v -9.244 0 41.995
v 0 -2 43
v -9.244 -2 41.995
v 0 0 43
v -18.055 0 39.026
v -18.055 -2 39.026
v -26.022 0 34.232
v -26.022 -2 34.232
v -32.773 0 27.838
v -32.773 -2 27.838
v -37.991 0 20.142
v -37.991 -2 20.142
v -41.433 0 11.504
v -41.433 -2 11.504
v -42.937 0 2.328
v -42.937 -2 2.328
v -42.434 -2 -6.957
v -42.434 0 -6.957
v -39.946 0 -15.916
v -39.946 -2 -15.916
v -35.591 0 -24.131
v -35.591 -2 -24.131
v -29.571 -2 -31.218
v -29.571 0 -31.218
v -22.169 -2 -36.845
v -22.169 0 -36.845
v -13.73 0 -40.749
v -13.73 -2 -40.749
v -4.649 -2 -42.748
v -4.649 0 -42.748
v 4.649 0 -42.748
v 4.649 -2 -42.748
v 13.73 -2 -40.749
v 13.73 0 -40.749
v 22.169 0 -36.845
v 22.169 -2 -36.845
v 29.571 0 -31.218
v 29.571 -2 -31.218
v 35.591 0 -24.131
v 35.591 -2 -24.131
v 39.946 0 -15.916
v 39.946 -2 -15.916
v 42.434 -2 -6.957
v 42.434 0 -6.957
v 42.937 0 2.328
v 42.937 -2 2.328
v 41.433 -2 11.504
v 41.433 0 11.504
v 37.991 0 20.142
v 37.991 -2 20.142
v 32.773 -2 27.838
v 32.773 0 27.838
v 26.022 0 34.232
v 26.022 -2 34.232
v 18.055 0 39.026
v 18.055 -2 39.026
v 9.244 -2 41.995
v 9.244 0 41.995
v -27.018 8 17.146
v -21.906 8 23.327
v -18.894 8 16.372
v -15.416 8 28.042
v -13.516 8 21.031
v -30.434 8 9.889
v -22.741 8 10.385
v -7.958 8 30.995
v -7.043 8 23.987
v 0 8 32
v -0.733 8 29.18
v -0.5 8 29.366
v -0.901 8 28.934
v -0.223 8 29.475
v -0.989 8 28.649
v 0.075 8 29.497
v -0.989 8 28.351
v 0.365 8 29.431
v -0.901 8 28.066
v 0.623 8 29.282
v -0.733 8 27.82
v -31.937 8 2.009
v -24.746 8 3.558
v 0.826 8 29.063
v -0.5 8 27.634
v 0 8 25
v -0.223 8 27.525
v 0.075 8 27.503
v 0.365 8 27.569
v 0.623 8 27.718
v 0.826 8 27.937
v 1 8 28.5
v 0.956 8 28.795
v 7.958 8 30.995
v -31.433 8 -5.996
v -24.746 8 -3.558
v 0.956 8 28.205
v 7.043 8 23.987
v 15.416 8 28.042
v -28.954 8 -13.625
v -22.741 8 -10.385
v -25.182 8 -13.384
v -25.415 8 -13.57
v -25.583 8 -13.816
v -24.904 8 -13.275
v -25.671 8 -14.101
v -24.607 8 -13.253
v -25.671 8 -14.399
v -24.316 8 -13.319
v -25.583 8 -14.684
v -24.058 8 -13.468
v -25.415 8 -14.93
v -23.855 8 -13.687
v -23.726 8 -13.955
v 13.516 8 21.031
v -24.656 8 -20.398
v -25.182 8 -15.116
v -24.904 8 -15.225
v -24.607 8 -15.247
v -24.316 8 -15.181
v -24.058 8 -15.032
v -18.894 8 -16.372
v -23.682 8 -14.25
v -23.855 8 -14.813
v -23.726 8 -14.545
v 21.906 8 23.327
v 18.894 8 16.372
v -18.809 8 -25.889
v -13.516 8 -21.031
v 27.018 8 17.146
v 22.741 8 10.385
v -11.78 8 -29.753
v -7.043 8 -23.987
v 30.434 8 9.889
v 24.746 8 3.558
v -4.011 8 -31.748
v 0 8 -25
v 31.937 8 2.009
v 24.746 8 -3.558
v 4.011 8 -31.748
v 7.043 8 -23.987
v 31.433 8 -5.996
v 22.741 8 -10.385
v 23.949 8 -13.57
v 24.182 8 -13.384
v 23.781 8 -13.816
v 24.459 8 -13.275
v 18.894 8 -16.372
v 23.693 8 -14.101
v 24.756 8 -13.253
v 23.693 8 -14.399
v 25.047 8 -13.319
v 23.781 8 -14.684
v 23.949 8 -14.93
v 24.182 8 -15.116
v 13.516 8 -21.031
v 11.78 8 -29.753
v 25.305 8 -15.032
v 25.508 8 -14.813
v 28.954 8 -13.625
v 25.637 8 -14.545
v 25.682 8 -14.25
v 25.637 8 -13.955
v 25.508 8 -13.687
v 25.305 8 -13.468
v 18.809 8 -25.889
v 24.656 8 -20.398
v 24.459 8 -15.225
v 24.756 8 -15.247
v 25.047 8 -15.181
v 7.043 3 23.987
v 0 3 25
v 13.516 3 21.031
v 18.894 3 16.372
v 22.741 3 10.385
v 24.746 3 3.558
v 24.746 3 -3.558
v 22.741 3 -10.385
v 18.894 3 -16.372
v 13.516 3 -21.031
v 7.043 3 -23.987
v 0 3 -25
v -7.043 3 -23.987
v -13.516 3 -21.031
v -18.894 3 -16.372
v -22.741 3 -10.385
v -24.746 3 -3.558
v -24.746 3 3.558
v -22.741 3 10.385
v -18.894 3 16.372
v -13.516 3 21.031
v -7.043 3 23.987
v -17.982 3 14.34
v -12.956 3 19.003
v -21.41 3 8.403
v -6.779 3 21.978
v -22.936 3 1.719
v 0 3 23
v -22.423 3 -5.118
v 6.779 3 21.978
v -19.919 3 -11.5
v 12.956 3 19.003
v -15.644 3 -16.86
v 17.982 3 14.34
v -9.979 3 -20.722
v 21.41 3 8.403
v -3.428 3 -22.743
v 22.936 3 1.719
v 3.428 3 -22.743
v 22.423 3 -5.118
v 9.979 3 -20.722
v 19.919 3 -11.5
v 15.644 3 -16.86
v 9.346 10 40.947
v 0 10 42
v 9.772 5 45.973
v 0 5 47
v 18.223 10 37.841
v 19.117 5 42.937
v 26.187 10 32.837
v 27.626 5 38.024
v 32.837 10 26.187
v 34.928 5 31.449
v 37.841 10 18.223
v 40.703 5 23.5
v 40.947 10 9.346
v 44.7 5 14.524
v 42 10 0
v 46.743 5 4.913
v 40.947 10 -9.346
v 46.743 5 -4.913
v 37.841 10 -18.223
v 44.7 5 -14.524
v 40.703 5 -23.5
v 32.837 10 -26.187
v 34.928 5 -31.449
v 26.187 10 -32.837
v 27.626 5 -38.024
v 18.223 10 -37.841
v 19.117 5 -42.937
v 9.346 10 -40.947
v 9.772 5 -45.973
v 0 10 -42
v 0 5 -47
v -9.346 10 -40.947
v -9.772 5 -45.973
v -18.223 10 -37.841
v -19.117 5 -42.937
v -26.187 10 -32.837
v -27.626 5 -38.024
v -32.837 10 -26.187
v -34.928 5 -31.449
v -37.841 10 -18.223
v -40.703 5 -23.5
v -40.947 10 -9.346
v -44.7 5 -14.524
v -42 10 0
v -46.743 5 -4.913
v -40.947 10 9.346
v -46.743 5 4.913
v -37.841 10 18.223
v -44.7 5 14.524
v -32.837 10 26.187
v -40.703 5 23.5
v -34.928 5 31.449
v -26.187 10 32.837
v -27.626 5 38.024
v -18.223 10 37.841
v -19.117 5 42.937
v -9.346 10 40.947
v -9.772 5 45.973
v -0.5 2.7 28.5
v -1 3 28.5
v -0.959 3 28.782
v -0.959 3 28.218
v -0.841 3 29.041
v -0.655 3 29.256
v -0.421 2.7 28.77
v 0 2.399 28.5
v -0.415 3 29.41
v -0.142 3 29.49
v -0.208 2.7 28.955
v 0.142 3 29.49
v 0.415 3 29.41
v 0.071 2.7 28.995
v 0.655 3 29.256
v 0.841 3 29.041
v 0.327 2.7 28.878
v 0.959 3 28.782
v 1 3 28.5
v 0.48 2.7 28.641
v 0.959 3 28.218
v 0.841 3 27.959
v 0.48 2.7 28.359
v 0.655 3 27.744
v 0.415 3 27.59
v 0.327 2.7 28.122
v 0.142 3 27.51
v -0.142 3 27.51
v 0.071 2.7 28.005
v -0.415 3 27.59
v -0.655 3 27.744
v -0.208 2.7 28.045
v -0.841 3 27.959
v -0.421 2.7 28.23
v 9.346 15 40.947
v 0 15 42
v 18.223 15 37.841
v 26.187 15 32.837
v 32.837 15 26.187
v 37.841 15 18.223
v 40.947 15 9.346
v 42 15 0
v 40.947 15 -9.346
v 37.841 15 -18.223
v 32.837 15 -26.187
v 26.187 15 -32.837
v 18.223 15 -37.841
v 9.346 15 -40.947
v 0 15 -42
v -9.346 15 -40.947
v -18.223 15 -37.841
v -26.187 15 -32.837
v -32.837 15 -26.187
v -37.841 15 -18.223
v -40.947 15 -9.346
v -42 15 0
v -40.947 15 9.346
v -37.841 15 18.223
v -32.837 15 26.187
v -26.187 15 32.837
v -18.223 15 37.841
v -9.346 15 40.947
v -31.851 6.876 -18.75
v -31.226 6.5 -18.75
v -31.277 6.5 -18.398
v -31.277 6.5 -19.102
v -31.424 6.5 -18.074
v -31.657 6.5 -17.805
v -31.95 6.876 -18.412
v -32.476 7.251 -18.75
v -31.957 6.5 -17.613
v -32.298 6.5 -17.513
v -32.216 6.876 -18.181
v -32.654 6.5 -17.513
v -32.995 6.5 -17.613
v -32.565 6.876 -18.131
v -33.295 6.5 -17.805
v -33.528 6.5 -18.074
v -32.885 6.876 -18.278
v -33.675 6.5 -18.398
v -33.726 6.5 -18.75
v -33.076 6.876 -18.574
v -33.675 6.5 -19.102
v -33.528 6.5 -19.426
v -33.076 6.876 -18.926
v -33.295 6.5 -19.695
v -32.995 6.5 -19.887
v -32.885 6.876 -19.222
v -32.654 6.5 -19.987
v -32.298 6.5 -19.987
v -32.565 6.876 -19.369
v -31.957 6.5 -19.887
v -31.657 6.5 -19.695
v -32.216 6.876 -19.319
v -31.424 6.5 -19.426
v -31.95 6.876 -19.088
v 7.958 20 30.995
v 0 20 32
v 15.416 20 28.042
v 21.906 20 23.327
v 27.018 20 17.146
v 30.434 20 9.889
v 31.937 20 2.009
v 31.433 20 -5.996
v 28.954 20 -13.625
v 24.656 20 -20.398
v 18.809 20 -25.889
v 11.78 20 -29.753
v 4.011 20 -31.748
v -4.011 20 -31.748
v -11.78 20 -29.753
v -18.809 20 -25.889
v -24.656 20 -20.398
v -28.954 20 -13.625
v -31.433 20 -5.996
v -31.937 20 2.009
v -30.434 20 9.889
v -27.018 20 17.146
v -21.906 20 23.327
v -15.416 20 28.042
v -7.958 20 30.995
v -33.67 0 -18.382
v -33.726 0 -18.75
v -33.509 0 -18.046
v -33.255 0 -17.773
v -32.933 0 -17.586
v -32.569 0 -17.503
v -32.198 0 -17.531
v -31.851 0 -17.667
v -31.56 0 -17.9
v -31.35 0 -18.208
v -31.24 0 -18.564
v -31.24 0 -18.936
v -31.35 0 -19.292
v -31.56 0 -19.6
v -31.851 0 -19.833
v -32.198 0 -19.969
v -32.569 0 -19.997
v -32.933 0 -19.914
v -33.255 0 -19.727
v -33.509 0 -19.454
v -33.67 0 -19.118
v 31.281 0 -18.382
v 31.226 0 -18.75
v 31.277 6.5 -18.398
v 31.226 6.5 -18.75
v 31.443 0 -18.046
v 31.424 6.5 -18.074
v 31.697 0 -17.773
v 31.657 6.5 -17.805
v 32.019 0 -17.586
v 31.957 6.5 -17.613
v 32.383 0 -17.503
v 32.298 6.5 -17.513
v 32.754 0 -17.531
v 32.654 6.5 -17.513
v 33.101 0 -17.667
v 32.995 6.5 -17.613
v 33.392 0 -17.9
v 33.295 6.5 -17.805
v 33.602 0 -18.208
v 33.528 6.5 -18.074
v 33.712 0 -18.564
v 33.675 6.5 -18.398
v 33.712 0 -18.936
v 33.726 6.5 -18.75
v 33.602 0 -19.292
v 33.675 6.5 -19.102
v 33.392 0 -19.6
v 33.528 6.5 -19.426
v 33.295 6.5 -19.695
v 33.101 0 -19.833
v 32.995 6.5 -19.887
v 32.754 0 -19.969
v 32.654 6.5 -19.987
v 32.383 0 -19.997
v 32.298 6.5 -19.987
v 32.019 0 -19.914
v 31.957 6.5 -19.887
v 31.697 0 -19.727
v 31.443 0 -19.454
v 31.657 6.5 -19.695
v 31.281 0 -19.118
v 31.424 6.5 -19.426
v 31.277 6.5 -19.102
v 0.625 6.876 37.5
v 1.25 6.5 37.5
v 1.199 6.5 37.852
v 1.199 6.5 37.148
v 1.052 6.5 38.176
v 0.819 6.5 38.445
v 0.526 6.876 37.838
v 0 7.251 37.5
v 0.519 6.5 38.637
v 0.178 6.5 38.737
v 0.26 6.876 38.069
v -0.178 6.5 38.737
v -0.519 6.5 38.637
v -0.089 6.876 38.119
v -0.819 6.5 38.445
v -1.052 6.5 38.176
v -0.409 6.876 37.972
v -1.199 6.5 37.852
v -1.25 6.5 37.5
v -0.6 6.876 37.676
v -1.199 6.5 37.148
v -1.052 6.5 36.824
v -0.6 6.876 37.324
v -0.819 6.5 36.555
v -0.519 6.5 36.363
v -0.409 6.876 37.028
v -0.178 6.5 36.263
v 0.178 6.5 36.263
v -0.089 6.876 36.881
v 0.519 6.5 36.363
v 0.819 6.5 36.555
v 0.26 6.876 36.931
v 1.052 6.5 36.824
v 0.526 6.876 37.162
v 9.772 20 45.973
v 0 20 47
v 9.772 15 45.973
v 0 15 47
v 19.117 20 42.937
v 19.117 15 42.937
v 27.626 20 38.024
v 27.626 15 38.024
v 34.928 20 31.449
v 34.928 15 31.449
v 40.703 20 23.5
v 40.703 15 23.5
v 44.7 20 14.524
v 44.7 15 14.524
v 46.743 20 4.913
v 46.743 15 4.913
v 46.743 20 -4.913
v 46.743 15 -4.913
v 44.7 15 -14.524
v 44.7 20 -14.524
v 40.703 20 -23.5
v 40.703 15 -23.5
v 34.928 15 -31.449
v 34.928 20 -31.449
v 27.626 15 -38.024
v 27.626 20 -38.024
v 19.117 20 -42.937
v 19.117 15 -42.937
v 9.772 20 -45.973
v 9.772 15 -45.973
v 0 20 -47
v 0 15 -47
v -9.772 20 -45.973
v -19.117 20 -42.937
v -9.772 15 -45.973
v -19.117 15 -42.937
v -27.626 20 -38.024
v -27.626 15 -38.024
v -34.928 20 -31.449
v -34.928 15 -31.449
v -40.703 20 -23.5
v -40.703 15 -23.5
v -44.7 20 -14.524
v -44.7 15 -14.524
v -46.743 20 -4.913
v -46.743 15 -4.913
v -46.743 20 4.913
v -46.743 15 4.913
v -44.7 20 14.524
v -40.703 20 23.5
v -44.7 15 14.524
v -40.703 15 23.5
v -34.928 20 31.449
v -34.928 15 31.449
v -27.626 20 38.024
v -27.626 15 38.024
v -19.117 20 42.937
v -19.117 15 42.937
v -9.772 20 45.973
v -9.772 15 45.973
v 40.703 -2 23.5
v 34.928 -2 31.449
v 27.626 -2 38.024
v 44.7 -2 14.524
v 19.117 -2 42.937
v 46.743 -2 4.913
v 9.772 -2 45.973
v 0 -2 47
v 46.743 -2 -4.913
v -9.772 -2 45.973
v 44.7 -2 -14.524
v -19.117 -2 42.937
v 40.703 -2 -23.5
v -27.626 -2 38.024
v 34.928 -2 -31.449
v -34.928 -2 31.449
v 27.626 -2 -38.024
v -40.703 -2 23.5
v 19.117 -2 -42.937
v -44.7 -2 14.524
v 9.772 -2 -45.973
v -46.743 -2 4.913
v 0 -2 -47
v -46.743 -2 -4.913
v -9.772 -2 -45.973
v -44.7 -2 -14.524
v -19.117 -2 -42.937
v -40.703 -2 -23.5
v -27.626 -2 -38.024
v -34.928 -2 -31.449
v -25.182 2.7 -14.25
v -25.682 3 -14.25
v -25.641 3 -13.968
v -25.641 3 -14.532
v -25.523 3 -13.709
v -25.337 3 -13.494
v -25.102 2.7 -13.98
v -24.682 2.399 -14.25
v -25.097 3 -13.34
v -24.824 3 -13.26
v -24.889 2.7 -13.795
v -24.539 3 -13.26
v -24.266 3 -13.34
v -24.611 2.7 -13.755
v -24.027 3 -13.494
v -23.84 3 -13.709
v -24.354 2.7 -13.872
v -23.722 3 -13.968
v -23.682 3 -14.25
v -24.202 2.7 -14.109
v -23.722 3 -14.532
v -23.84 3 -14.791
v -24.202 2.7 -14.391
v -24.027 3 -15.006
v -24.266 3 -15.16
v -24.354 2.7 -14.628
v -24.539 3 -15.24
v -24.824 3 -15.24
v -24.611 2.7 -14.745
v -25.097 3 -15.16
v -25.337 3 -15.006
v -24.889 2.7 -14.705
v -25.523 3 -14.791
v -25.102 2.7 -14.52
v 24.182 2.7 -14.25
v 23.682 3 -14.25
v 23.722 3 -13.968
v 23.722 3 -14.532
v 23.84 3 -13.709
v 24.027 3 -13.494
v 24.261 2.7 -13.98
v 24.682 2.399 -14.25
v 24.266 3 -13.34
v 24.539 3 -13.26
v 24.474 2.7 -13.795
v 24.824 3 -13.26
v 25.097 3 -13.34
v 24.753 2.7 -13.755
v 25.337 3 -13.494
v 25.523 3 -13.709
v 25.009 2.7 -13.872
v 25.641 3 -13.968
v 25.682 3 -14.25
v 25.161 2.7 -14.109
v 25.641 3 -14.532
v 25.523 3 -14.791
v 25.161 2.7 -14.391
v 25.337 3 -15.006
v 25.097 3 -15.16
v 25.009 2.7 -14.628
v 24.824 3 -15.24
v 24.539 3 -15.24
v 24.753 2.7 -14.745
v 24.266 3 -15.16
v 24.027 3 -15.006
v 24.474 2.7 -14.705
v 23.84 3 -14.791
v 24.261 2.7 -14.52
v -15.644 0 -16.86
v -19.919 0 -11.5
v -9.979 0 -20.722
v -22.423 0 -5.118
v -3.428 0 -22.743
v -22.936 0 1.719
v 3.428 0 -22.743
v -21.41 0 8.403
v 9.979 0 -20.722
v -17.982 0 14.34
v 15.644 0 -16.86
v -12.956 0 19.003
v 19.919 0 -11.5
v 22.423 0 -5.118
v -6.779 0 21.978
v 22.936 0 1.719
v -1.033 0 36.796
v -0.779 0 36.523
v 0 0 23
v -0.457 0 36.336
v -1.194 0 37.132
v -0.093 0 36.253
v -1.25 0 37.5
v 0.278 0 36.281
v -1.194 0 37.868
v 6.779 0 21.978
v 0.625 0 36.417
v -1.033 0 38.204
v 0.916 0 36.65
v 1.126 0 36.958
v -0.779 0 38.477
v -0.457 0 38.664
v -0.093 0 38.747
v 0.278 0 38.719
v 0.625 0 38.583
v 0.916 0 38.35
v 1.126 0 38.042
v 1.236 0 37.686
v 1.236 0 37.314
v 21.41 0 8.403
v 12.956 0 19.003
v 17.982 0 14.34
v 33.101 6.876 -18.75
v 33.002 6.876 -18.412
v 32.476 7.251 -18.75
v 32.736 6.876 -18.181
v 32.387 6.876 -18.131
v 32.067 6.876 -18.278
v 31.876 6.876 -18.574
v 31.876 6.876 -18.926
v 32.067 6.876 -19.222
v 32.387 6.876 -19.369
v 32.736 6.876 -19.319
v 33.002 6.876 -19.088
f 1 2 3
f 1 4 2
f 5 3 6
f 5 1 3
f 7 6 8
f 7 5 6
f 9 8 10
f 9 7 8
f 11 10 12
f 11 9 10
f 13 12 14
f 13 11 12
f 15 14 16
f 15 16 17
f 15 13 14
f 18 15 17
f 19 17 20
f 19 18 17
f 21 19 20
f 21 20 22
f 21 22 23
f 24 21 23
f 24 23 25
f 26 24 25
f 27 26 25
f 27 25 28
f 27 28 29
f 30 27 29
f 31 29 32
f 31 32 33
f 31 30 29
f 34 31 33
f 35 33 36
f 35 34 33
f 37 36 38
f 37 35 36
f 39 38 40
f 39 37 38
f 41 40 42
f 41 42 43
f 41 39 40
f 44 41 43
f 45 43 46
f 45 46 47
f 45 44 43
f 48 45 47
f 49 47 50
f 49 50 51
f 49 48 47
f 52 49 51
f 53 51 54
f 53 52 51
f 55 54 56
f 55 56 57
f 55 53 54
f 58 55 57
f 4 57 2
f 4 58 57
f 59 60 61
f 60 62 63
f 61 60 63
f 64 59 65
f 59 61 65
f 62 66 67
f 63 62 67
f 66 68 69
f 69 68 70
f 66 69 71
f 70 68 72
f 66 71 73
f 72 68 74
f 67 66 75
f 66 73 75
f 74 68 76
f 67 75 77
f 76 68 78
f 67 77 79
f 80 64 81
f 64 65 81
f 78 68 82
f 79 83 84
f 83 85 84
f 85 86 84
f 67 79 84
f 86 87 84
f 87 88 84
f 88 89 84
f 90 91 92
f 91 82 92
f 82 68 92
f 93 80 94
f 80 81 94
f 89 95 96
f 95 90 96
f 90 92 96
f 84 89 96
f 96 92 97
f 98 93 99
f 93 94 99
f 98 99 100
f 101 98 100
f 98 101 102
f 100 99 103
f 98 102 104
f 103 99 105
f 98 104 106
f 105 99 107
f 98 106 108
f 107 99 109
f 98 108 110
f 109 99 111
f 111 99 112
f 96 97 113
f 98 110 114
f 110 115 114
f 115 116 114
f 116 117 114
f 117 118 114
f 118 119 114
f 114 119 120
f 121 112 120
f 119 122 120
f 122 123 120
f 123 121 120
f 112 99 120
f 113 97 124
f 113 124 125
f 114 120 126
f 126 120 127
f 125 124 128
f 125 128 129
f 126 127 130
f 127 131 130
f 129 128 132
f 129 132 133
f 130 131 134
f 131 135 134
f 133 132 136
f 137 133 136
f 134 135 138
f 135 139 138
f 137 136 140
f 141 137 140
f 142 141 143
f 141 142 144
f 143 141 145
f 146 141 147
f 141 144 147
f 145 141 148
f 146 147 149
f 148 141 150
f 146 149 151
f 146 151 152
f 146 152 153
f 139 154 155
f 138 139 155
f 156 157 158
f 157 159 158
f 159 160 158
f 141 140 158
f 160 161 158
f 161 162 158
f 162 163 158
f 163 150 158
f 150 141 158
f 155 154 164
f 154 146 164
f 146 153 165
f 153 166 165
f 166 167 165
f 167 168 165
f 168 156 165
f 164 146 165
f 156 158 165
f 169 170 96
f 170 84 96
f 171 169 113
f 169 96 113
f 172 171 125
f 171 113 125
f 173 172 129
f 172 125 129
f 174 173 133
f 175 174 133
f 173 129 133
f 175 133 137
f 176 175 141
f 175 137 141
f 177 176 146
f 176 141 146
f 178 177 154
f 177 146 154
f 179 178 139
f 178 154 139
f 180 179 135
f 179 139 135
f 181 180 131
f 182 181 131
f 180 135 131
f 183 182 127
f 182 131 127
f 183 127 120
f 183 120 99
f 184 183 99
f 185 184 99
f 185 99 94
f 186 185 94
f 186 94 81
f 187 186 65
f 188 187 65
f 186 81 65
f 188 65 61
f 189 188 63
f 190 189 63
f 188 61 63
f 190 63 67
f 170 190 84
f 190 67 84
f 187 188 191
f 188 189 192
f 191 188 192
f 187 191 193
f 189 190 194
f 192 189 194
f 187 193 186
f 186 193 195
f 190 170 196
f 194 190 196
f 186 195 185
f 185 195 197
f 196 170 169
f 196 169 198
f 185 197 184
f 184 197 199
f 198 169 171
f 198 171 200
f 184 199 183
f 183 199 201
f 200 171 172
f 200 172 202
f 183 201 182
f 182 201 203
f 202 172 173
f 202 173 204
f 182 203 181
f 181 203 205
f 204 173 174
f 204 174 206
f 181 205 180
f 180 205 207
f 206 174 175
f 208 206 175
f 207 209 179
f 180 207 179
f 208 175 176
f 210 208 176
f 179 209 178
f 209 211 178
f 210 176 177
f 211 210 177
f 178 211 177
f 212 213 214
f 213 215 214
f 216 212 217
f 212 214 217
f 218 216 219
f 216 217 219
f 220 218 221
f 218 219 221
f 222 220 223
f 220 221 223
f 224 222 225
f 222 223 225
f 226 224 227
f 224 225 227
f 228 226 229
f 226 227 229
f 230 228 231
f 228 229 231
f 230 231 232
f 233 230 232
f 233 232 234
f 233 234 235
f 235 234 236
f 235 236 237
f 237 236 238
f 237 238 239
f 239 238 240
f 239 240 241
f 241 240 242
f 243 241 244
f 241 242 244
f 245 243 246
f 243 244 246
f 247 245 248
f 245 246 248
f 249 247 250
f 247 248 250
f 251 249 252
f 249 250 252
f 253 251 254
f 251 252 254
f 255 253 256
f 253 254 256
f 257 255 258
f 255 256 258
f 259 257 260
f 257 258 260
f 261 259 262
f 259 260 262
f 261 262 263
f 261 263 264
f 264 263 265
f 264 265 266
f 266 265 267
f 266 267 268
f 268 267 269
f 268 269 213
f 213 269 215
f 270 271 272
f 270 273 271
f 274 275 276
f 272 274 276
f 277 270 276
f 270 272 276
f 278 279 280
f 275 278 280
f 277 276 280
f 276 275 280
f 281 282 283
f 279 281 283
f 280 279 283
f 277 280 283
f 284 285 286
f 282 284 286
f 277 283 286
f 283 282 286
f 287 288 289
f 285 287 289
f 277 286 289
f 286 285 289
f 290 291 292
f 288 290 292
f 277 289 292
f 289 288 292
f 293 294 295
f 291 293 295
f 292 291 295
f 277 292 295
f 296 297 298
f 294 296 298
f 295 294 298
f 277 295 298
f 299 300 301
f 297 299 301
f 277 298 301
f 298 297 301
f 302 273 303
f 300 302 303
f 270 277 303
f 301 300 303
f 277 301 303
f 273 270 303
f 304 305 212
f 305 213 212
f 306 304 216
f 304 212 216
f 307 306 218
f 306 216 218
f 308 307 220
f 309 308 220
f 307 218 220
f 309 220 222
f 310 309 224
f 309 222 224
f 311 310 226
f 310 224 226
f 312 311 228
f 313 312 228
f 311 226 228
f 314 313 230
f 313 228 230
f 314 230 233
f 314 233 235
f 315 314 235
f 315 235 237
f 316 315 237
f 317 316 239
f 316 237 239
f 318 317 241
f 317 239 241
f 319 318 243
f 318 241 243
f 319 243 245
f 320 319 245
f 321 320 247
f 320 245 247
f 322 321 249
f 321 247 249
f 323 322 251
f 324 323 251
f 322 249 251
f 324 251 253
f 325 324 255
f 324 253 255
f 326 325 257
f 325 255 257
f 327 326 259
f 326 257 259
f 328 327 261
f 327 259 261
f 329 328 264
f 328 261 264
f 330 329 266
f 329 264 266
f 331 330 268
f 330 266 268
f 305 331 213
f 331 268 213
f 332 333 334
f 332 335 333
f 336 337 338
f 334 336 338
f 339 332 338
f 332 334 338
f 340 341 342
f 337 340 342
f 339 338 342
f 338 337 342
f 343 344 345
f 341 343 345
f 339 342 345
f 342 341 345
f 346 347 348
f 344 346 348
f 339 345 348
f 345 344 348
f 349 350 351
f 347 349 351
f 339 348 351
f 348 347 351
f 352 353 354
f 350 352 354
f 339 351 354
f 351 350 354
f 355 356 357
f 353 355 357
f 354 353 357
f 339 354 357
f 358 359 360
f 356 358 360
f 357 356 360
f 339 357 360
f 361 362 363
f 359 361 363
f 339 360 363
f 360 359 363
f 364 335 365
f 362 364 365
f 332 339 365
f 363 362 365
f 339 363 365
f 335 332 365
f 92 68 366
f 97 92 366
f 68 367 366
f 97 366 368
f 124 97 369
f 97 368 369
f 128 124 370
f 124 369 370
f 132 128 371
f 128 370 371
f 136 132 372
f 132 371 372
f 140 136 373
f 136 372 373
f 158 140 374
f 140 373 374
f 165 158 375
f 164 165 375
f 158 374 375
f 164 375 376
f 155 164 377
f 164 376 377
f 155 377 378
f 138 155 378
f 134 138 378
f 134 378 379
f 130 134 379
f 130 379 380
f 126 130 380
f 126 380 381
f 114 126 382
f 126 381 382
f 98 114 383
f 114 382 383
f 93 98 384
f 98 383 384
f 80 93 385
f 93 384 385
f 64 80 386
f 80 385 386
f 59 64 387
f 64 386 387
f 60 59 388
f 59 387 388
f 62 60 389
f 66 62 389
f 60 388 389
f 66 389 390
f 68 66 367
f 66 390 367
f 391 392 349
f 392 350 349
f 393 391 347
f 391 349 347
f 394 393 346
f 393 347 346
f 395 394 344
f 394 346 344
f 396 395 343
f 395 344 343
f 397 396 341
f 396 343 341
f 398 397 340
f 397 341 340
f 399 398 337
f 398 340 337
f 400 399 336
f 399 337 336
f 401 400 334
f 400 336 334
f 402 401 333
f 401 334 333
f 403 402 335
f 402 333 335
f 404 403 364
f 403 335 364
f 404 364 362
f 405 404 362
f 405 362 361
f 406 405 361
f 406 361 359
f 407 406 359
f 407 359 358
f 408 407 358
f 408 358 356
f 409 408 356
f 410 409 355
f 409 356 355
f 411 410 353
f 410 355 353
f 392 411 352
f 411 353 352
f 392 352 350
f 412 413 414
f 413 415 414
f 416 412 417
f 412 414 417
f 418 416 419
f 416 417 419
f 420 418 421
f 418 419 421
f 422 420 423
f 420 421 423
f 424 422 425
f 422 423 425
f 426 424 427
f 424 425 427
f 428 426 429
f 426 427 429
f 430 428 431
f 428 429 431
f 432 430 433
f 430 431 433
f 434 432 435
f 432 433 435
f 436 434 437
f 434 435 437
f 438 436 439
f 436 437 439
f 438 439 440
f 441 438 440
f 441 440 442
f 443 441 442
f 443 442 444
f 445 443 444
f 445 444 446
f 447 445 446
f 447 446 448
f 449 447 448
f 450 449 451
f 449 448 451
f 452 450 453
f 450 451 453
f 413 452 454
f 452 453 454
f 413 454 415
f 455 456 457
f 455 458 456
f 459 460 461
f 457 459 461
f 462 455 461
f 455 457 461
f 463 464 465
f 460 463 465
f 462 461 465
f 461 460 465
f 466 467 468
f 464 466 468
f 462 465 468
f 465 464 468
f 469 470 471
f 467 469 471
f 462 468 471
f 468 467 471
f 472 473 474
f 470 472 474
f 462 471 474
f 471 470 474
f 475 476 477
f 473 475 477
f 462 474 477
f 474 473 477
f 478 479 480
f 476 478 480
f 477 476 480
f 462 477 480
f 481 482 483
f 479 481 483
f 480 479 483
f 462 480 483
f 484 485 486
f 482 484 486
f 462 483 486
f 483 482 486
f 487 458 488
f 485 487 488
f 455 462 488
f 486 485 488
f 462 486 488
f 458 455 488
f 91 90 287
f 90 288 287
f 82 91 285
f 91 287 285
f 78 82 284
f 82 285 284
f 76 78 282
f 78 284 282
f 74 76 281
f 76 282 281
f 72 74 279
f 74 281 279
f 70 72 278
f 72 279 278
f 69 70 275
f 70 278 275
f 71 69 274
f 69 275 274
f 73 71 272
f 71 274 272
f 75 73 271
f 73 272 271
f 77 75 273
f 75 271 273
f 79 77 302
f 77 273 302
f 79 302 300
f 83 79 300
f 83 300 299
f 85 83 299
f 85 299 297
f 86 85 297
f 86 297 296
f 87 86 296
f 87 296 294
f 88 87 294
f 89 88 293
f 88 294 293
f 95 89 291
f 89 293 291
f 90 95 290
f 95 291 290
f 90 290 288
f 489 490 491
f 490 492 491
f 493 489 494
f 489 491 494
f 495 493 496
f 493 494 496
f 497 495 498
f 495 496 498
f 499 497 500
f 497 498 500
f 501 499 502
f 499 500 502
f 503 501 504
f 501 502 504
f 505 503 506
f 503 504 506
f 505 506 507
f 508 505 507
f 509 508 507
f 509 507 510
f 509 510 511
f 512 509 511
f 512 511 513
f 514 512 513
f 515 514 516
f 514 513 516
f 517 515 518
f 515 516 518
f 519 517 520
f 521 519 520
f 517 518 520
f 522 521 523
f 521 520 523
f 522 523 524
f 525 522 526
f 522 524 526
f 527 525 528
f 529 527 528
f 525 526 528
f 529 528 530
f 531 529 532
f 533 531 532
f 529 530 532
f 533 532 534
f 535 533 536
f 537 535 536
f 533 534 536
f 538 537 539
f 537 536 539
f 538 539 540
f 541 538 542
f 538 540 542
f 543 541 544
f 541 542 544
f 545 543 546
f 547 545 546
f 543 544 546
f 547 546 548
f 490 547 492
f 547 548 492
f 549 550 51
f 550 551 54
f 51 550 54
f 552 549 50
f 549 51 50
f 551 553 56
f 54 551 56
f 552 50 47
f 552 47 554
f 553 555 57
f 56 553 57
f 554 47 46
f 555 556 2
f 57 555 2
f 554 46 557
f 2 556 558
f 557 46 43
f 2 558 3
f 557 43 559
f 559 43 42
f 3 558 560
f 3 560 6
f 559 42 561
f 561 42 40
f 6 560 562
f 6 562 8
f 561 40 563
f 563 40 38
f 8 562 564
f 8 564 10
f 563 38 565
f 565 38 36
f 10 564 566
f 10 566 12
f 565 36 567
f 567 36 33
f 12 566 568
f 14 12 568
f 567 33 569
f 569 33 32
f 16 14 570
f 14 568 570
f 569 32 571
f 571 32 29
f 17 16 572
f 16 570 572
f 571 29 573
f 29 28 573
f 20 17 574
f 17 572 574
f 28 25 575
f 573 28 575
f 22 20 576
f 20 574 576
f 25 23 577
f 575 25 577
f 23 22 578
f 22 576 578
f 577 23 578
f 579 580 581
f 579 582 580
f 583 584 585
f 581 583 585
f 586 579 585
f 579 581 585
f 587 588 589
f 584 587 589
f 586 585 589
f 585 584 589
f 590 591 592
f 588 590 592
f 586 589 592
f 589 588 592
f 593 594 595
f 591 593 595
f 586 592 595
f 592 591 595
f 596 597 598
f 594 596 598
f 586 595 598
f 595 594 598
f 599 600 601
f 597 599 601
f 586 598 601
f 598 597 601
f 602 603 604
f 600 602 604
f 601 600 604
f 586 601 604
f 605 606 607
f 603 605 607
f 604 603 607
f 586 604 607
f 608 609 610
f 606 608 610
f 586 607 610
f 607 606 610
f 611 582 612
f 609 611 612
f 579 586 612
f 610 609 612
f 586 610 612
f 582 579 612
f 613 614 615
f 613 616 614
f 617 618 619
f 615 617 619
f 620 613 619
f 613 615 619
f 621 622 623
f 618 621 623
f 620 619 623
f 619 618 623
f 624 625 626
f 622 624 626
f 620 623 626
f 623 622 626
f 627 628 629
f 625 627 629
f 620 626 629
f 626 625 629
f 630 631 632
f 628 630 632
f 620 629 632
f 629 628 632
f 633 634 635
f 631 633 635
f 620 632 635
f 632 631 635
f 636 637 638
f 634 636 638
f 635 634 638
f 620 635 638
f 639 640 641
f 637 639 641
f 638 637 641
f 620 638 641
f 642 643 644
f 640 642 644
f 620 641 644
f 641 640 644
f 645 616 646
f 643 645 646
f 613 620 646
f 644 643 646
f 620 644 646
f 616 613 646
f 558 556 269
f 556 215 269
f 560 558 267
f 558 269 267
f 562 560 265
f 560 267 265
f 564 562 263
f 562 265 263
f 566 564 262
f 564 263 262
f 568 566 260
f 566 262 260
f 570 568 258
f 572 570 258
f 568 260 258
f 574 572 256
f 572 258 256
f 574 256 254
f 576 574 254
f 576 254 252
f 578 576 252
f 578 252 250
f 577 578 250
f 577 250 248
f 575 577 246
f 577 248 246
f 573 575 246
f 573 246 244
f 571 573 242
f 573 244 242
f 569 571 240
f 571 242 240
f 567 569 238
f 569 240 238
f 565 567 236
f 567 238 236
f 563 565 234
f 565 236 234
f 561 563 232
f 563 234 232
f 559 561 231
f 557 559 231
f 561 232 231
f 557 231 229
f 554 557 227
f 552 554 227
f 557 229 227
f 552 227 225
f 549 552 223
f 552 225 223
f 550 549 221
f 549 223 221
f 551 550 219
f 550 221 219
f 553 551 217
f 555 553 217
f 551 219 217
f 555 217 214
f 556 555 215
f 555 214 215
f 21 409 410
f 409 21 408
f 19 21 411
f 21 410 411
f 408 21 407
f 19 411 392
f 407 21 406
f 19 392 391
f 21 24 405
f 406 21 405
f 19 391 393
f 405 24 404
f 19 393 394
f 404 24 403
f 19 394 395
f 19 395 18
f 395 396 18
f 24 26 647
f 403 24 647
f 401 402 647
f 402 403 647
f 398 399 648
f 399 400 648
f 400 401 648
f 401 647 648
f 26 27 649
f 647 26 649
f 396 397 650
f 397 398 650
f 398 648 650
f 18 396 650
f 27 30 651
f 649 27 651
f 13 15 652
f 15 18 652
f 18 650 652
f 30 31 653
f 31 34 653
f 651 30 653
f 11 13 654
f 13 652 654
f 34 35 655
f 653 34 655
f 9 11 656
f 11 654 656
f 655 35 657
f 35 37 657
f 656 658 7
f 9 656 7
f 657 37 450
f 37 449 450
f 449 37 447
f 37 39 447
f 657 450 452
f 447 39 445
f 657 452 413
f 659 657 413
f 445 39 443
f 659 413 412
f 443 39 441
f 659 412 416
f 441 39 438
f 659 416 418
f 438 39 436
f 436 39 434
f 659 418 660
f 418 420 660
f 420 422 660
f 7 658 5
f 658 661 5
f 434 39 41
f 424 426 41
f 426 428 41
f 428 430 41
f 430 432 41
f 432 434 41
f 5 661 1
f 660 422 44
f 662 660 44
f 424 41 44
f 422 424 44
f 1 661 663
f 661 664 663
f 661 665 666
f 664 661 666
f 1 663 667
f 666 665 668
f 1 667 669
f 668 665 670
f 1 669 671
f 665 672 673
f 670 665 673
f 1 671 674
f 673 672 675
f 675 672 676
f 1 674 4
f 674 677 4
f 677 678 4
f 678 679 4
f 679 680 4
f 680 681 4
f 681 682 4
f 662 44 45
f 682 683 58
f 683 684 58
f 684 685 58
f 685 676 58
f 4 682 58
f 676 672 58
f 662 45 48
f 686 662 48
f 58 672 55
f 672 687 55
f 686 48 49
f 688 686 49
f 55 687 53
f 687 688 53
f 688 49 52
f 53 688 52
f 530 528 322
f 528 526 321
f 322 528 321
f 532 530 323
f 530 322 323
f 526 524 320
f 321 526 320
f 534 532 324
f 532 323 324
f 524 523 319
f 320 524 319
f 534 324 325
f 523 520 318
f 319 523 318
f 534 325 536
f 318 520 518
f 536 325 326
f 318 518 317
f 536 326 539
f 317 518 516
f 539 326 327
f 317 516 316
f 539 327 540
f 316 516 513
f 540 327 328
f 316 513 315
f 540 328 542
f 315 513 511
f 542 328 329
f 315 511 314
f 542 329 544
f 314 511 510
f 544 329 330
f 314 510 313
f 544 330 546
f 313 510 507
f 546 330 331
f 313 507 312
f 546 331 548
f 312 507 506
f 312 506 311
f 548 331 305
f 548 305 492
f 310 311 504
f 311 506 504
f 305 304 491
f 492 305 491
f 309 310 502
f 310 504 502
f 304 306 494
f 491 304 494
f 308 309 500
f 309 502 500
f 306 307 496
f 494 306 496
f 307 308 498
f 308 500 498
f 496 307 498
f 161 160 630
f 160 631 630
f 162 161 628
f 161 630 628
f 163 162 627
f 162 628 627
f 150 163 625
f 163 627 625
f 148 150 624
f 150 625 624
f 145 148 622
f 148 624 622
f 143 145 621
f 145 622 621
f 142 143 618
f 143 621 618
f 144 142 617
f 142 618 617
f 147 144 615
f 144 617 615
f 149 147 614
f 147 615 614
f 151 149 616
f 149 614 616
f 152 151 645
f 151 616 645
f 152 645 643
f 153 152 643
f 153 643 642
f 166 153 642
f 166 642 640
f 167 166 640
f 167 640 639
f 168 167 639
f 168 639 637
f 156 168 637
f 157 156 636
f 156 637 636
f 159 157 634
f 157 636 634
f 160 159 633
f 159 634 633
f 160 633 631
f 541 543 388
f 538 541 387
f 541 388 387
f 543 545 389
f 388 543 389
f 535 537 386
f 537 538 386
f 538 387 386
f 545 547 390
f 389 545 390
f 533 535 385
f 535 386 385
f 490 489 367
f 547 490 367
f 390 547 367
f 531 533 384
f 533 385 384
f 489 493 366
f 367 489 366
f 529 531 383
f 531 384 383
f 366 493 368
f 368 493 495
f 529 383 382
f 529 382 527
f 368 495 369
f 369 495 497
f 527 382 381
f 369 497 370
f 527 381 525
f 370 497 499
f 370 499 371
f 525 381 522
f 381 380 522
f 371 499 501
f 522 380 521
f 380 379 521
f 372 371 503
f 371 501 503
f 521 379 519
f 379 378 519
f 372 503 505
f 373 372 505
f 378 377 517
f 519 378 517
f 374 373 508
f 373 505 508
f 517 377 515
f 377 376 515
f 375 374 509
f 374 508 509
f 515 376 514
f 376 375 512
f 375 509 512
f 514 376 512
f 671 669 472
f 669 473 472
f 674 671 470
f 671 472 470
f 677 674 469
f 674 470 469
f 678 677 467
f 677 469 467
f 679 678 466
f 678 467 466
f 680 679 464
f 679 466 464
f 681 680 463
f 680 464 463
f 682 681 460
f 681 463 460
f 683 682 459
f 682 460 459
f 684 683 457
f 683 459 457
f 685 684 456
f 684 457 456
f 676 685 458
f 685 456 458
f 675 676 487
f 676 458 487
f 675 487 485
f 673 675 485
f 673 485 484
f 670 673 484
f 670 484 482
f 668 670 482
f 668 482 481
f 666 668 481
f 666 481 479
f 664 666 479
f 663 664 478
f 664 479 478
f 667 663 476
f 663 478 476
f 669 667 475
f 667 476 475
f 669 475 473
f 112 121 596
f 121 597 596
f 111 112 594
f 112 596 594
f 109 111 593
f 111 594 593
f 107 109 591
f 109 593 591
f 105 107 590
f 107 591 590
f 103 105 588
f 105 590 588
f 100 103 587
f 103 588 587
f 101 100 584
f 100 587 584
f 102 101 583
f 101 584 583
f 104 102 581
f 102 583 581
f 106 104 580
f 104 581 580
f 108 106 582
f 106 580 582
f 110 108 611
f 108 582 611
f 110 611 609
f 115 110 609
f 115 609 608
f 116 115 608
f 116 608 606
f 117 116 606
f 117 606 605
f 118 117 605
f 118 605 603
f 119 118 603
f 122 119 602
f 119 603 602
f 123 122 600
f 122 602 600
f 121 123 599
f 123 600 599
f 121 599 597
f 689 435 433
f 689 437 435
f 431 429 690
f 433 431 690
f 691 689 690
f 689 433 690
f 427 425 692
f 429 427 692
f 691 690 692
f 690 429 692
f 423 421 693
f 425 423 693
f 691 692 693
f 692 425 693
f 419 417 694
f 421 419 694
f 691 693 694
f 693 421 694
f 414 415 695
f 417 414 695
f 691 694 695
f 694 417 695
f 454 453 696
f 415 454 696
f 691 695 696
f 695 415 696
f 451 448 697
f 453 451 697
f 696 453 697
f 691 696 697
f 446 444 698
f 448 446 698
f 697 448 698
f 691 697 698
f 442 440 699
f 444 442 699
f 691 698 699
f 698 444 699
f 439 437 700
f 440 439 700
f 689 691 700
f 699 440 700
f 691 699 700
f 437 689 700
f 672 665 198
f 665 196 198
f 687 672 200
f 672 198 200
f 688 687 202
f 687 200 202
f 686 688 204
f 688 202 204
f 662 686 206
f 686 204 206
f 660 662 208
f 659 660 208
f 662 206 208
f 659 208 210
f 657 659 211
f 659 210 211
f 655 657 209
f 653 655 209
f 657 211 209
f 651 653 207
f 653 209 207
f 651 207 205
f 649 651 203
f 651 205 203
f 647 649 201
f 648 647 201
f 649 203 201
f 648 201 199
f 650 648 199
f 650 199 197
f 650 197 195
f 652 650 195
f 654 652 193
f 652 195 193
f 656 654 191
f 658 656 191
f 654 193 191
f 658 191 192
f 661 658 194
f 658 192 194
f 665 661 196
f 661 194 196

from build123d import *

# Parameters (mm, degrees)
F3_D     = 2
F3_DEPTH = 5
F3_TIP   = 0.600860619
F4_W     = 2
F4_H     = 4
F7_D     = 2.5
F7_DEPTH = 6.5
F7_TIP   = 0.7510757738


with BuildPart() as f1:
    # F0 (on Right) → F1 (revolve)
    with BuildSketch(Plane.YZ):
        Polygon((5, 47), (0, 47), (0, 23), (3, 23), (3, 25), (8, 25), (8, 32), (20, 32), (20, 47), (15, 47), (15, 42), (10, 42), align=None)
    revolve(axis=Axis((0, 13.034472242, 0), (0, 1, 0)))

    # F3
    with Locations(Plane(origin=(0, 8, 0), x_dir=(-1, 0, 0), z_dir=(0, 1, 0))):
        with Locations((0, 28.5), (24.6817240079, -14.25), (-24.6817240079, -14.25)):
            Hole(F3_D / 2, depth=F3_DEPTH)
            with Locations((0, 0, -(F3_DEPTH + F3_TIP / 2))):  # 118° drill point
                Cone(0, F3_D / 2, F3_TIP, mode=Mode.SUBTRACT)

    # F4 (on Right) → F5 (revolve)
    with BuildSketch(Plane.YZ):
        with Locations((-1, 45)):
            Rectangle(F4_W, F4_H)
    revolve(axis=Axis((0, -7.9047670588, 0), (0, -1, 0)))

    # F7
    with Locations(Plane.XZ):
        with Locations((0, 37.5), (32.4759526419, -18.75), (-32.4759526419, -18.75)):
            Hole(F7_D / 2, depth=F7_DEPTH)
            with Locations((0, 0, -(F7_DEPTH + F7_TIP / 2))):  # 118° drill point
                Cone(0, F7_D / 2, F7_TIP, mode=Mode.SUBTRACT)


solid = f1.part
